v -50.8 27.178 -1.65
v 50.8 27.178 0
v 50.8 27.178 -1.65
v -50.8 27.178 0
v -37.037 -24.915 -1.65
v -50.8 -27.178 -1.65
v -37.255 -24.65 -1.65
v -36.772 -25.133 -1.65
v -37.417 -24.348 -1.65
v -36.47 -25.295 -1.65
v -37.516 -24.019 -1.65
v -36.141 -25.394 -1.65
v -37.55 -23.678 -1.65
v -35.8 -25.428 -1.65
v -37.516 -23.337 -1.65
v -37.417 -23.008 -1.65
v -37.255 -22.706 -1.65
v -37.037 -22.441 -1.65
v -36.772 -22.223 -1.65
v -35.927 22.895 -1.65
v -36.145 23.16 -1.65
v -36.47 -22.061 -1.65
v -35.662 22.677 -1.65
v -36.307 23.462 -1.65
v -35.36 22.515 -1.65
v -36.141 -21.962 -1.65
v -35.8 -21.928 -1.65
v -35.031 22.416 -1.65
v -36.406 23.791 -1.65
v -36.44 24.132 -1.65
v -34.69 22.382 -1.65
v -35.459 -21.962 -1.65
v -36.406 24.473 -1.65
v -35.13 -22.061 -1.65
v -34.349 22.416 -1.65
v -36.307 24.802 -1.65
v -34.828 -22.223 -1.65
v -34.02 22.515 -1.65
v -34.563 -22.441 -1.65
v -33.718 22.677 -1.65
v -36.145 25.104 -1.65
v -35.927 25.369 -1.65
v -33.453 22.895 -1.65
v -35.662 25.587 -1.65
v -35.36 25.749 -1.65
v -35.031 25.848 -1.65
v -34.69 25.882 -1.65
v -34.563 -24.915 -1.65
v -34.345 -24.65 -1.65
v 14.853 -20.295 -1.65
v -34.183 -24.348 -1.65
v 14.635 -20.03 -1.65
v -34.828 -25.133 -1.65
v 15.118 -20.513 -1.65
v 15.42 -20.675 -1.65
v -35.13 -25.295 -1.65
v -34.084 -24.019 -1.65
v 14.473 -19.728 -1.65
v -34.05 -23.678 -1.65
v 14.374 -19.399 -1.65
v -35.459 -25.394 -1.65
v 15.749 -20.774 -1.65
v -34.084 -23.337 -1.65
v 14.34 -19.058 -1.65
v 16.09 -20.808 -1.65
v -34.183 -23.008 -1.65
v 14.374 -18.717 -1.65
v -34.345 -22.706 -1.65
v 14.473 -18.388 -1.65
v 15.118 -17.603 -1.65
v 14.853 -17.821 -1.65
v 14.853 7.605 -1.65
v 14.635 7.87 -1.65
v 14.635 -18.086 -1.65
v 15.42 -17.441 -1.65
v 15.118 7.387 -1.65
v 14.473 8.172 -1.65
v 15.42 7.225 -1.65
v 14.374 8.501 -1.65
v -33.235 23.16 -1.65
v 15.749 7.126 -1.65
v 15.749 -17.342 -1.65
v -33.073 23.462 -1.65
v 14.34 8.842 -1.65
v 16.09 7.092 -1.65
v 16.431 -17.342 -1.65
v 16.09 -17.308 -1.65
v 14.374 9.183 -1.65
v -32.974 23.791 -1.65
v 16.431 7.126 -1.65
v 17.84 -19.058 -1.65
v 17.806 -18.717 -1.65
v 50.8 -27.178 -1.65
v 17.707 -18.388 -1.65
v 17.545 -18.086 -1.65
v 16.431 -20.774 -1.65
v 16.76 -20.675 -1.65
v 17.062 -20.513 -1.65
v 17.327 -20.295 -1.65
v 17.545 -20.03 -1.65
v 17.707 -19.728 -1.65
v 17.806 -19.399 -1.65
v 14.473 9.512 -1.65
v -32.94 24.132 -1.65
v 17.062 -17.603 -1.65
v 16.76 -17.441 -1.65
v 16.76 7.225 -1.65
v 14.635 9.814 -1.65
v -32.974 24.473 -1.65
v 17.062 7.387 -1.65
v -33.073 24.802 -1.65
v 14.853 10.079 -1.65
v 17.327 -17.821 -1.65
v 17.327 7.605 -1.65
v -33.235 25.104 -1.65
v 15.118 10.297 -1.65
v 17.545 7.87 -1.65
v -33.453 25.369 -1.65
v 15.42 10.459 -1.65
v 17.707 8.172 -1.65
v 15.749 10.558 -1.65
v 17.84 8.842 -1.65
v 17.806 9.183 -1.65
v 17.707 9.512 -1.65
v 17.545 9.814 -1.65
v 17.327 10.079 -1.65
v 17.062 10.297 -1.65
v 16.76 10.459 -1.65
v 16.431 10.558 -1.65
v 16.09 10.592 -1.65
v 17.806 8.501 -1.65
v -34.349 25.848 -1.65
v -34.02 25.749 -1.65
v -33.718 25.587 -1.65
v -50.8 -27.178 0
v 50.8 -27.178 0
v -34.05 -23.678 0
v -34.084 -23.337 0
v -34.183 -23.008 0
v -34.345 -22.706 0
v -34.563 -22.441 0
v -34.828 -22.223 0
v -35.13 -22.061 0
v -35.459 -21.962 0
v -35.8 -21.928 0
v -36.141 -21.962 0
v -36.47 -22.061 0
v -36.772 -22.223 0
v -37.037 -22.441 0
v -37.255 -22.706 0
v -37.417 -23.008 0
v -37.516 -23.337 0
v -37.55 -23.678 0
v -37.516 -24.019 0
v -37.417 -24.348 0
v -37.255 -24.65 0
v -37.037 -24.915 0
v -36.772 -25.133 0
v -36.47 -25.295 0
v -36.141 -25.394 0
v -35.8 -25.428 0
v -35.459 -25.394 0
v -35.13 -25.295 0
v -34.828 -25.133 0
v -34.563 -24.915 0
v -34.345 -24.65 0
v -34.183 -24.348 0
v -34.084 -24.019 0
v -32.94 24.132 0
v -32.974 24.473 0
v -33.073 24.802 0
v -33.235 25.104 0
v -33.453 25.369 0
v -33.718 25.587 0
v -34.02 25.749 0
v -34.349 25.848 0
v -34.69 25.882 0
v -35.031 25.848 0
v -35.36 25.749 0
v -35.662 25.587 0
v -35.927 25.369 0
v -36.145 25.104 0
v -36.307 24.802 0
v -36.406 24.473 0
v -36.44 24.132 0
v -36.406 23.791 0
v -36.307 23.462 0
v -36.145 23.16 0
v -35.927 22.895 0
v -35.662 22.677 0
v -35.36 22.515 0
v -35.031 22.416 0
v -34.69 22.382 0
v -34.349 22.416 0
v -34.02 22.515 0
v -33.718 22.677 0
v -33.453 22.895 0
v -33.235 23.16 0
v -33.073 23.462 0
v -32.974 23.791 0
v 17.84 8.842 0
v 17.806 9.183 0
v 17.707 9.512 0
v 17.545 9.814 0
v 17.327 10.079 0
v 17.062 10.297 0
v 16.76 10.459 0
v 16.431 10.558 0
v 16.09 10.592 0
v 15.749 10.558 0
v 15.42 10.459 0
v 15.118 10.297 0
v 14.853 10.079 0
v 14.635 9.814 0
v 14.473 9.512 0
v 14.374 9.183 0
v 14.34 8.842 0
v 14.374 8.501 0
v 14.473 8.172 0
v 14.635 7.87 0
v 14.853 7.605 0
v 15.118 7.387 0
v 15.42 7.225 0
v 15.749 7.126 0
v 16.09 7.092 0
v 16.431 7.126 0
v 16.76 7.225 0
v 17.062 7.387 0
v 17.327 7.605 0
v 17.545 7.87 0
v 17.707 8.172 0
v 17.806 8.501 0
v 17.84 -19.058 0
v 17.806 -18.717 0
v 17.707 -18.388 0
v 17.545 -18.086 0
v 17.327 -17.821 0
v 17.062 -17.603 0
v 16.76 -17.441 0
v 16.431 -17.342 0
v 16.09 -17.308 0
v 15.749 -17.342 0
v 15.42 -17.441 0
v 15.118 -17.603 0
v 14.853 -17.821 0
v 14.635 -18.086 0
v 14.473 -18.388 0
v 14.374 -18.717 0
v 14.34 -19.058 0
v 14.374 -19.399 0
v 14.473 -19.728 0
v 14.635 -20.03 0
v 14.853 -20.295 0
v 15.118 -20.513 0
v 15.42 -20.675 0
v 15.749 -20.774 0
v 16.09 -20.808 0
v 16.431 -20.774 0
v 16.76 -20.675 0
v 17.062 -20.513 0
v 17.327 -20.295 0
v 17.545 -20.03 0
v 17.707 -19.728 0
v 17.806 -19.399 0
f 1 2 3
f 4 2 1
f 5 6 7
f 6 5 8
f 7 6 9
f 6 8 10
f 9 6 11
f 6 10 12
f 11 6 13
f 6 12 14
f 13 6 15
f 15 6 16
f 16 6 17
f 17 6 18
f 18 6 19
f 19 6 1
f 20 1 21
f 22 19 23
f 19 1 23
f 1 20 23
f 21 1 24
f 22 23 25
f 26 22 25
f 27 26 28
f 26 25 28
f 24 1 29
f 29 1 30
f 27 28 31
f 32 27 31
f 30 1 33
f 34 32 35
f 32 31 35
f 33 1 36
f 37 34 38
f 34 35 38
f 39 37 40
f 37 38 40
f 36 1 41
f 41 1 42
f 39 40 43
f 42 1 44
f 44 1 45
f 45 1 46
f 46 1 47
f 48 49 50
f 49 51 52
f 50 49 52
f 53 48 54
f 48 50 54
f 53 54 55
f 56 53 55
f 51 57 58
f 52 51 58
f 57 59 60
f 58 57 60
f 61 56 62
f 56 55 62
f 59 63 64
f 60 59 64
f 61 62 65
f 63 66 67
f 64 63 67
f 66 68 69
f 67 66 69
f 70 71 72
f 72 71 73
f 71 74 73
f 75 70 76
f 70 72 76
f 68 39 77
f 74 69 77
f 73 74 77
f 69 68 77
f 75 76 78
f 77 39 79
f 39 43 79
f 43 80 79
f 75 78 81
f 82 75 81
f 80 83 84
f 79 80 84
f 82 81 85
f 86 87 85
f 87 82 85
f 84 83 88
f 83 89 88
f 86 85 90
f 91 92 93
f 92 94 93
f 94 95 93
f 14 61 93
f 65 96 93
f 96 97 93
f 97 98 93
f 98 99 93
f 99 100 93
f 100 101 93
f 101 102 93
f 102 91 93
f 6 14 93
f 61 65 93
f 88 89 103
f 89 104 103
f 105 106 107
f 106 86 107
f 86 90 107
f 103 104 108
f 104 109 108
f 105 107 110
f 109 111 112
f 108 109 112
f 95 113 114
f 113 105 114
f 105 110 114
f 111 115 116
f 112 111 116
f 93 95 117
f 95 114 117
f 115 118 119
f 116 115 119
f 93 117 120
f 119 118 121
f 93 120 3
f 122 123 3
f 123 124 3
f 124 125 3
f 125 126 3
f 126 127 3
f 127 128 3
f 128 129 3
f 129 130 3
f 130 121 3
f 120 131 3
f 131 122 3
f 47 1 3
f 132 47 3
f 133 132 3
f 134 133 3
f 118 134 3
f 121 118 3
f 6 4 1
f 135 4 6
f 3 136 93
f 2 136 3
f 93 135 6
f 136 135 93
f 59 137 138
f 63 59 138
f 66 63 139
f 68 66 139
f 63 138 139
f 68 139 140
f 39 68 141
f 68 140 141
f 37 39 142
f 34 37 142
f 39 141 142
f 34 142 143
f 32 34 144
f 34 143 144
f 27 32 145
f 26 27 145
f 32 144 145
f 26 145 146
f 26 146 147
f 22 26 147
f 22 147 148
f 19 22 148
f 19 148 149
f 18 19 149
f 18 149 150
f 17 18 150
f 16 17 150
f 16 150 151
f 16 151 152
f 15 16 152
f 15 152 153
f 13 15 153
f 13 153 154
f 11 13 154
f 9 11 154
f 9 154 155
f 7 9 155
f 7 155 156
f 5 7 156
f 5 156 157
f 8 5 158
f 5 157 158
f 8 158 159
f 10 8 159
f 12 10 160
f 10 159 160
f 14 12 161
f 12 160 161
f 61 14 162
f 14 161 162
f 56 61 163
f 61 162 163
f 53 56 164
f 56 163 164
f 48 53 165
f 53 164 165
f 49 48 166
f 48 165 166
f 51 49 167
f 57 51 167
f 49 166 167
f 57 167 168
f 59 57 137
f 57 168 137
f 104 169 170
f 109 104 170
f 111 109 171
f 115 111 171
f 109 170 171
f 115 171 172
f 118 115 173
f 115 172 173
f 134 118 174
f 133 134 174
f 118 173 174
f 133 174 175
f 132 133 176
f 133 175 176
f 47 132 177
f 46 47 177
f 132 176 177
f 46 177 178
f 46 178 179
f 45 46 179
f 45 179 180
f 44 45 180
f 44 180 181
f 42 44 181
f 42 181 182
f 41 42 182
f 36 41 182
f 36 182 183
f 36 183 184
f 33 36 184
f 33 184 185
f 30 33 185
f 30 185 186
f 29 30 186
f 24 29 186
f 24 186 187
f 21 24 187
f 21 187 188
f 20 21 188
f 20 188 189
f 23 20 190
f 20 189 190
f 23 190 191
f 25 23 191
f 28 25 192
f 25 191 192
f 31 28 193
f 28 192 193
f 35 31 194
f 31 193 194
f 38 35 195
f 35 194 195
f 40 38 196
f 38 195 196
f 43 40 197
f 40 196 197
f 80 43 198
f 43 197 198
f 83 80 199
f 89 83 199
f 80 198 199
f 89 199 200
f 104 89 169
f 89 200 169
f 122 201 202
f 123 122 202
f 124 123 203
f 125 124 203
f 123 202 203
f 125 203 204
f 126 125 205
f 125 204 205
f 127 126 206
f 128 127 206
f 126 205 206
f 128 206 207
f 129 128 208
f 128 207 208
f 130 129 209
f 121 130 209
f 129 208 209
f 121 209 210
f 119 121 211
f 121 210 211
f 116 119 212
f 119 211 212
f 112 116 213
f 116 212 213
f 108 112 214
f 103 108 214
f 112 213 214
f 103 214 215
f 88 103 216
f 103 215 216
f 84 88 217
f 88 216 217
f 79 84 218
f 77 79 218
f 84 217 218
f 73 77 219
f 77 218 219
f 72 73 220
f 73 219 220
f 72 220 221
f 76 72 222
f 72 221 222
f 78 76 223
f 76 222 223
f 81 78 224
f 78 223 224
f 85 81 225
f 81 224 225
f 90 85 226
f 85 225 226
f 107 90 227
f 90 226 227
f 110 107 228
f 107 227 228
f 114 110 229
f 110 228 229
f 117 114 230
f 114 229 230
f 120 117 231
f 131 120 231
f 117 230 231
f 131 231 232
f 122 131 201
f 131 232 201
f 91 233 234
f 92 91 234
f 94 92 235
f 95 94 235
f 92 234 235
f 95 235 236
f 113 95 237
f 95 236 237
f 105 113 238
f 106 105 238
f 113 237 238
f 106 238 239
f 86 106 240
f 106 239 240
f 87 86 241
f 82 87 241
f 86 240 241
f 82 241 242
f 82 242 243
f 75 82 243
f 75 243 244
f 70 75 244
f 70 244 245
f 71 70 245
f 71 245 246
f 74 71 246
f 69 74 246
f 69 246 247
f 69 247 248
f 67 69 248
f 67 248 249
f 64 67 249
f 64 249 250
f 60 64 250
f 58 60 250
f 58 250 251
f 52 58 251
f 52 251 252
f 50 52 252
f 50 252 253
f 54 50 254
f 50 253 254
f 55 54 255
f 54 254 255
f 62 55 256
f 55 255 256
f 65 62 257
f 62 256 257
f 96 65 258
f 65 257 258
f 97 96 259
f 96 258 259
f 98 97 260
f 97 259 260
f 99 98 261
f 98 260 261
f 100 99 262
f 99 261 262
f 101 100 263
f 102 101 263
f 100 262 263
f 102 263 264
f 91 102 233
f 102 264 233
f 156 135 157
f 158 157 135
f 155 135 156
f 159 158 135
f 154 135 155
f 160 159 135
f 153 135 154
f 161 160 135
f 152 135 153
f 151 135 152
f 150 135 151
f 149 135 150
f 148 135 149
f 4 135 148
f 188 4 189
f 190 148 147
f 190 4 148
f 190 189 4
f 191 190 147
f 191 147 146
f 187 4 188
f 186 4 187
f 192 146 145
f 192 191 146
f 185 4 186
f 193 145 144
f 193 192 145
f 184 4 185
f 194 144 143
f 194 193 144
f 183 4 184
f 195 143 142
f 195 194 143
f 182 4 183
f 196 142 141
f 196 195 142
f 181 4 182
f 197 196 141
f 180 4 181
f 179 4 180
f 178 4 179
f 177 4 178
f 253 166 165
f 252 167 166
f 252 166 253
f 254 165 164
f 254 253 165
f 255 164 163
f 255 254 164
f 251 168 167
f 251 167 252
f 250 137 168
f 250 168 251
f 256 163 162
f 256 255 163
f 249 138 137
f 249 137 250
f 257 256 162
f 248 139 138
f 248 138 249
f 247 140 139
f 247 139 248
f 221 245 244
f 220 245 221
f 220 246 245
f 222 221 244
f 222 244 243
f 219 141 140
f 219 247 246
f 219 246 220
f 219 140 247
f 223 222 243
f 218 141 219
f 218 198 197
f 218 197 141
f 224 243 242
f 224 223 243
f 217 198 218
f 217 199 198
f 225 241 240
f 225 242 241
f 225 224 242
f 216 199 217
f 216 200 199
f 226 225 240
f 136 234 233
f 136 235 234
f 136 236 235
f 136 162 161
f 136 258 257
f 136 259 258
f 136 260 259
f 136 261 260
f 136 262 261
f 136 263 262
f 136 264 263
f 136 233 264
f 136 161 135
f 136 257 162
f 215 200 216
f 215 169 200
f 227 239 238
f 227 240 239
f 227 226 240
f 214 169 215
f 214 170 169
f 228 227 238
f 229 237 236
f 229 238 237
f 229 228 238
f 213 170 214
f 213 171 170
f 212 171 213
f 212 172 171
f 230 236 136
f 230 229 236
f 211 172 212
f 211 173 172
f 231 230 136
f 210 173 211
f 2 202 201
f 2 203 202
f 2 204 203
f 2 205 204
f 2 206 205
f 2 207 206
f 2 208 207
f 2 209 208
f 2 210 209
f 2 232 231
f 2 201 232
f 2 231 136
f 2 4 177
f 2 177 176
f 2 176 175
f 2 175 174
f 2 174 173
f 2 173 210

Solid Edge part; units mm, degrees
sketch "Sketch1" plane through (0, 0, 0) normal (0, 0, 1) x (1, 0, 0)
  line L0 (-50.8, -27.178) -> (50.8, -27.178)
  line L1 (50.8, -27.178) -> (50.8, 27.178)
  line L2 (50.8, 27.178) -> (-50.8, 27.178)
  line L3 (-50.8, 27.178) -> (-50.8, -27.178)
extrude "Protrusion1" add sketch "Sketch1" against normal blind 1.65
sketch "Sketch2" plane through (0, 0, 0) normal (0, 0, 1) x (1, 0, 0)
  circle A0 centre (-34.69, 24.132) radius 1.75
  circle A1 centre (-35.8, -23.678) radius 1.75
  circle A2 centre (16.09, -19.058) radius 1.75
  circle A3 centre (16.09, 8.842) radius 1.75
  dimension "D1" = 3.5
  dimension "D2" = 3.5
  dimension "D3" = 3.5
  dimension "D4" = 1.11
  dimension "D5" = 47.81
  dimension "D6" = 3.5
  dimension "D7" = 4.62
  dimension "D8" = 27.9
  dimension "D9" = 51.89
  dimension "D10" = 22
  dimension "D11" = 15
  dimension "D12" = 3.5
extrude "Cutout1" cut sketch "Sketch2" against normal up to vertex (1.65 mm away)
